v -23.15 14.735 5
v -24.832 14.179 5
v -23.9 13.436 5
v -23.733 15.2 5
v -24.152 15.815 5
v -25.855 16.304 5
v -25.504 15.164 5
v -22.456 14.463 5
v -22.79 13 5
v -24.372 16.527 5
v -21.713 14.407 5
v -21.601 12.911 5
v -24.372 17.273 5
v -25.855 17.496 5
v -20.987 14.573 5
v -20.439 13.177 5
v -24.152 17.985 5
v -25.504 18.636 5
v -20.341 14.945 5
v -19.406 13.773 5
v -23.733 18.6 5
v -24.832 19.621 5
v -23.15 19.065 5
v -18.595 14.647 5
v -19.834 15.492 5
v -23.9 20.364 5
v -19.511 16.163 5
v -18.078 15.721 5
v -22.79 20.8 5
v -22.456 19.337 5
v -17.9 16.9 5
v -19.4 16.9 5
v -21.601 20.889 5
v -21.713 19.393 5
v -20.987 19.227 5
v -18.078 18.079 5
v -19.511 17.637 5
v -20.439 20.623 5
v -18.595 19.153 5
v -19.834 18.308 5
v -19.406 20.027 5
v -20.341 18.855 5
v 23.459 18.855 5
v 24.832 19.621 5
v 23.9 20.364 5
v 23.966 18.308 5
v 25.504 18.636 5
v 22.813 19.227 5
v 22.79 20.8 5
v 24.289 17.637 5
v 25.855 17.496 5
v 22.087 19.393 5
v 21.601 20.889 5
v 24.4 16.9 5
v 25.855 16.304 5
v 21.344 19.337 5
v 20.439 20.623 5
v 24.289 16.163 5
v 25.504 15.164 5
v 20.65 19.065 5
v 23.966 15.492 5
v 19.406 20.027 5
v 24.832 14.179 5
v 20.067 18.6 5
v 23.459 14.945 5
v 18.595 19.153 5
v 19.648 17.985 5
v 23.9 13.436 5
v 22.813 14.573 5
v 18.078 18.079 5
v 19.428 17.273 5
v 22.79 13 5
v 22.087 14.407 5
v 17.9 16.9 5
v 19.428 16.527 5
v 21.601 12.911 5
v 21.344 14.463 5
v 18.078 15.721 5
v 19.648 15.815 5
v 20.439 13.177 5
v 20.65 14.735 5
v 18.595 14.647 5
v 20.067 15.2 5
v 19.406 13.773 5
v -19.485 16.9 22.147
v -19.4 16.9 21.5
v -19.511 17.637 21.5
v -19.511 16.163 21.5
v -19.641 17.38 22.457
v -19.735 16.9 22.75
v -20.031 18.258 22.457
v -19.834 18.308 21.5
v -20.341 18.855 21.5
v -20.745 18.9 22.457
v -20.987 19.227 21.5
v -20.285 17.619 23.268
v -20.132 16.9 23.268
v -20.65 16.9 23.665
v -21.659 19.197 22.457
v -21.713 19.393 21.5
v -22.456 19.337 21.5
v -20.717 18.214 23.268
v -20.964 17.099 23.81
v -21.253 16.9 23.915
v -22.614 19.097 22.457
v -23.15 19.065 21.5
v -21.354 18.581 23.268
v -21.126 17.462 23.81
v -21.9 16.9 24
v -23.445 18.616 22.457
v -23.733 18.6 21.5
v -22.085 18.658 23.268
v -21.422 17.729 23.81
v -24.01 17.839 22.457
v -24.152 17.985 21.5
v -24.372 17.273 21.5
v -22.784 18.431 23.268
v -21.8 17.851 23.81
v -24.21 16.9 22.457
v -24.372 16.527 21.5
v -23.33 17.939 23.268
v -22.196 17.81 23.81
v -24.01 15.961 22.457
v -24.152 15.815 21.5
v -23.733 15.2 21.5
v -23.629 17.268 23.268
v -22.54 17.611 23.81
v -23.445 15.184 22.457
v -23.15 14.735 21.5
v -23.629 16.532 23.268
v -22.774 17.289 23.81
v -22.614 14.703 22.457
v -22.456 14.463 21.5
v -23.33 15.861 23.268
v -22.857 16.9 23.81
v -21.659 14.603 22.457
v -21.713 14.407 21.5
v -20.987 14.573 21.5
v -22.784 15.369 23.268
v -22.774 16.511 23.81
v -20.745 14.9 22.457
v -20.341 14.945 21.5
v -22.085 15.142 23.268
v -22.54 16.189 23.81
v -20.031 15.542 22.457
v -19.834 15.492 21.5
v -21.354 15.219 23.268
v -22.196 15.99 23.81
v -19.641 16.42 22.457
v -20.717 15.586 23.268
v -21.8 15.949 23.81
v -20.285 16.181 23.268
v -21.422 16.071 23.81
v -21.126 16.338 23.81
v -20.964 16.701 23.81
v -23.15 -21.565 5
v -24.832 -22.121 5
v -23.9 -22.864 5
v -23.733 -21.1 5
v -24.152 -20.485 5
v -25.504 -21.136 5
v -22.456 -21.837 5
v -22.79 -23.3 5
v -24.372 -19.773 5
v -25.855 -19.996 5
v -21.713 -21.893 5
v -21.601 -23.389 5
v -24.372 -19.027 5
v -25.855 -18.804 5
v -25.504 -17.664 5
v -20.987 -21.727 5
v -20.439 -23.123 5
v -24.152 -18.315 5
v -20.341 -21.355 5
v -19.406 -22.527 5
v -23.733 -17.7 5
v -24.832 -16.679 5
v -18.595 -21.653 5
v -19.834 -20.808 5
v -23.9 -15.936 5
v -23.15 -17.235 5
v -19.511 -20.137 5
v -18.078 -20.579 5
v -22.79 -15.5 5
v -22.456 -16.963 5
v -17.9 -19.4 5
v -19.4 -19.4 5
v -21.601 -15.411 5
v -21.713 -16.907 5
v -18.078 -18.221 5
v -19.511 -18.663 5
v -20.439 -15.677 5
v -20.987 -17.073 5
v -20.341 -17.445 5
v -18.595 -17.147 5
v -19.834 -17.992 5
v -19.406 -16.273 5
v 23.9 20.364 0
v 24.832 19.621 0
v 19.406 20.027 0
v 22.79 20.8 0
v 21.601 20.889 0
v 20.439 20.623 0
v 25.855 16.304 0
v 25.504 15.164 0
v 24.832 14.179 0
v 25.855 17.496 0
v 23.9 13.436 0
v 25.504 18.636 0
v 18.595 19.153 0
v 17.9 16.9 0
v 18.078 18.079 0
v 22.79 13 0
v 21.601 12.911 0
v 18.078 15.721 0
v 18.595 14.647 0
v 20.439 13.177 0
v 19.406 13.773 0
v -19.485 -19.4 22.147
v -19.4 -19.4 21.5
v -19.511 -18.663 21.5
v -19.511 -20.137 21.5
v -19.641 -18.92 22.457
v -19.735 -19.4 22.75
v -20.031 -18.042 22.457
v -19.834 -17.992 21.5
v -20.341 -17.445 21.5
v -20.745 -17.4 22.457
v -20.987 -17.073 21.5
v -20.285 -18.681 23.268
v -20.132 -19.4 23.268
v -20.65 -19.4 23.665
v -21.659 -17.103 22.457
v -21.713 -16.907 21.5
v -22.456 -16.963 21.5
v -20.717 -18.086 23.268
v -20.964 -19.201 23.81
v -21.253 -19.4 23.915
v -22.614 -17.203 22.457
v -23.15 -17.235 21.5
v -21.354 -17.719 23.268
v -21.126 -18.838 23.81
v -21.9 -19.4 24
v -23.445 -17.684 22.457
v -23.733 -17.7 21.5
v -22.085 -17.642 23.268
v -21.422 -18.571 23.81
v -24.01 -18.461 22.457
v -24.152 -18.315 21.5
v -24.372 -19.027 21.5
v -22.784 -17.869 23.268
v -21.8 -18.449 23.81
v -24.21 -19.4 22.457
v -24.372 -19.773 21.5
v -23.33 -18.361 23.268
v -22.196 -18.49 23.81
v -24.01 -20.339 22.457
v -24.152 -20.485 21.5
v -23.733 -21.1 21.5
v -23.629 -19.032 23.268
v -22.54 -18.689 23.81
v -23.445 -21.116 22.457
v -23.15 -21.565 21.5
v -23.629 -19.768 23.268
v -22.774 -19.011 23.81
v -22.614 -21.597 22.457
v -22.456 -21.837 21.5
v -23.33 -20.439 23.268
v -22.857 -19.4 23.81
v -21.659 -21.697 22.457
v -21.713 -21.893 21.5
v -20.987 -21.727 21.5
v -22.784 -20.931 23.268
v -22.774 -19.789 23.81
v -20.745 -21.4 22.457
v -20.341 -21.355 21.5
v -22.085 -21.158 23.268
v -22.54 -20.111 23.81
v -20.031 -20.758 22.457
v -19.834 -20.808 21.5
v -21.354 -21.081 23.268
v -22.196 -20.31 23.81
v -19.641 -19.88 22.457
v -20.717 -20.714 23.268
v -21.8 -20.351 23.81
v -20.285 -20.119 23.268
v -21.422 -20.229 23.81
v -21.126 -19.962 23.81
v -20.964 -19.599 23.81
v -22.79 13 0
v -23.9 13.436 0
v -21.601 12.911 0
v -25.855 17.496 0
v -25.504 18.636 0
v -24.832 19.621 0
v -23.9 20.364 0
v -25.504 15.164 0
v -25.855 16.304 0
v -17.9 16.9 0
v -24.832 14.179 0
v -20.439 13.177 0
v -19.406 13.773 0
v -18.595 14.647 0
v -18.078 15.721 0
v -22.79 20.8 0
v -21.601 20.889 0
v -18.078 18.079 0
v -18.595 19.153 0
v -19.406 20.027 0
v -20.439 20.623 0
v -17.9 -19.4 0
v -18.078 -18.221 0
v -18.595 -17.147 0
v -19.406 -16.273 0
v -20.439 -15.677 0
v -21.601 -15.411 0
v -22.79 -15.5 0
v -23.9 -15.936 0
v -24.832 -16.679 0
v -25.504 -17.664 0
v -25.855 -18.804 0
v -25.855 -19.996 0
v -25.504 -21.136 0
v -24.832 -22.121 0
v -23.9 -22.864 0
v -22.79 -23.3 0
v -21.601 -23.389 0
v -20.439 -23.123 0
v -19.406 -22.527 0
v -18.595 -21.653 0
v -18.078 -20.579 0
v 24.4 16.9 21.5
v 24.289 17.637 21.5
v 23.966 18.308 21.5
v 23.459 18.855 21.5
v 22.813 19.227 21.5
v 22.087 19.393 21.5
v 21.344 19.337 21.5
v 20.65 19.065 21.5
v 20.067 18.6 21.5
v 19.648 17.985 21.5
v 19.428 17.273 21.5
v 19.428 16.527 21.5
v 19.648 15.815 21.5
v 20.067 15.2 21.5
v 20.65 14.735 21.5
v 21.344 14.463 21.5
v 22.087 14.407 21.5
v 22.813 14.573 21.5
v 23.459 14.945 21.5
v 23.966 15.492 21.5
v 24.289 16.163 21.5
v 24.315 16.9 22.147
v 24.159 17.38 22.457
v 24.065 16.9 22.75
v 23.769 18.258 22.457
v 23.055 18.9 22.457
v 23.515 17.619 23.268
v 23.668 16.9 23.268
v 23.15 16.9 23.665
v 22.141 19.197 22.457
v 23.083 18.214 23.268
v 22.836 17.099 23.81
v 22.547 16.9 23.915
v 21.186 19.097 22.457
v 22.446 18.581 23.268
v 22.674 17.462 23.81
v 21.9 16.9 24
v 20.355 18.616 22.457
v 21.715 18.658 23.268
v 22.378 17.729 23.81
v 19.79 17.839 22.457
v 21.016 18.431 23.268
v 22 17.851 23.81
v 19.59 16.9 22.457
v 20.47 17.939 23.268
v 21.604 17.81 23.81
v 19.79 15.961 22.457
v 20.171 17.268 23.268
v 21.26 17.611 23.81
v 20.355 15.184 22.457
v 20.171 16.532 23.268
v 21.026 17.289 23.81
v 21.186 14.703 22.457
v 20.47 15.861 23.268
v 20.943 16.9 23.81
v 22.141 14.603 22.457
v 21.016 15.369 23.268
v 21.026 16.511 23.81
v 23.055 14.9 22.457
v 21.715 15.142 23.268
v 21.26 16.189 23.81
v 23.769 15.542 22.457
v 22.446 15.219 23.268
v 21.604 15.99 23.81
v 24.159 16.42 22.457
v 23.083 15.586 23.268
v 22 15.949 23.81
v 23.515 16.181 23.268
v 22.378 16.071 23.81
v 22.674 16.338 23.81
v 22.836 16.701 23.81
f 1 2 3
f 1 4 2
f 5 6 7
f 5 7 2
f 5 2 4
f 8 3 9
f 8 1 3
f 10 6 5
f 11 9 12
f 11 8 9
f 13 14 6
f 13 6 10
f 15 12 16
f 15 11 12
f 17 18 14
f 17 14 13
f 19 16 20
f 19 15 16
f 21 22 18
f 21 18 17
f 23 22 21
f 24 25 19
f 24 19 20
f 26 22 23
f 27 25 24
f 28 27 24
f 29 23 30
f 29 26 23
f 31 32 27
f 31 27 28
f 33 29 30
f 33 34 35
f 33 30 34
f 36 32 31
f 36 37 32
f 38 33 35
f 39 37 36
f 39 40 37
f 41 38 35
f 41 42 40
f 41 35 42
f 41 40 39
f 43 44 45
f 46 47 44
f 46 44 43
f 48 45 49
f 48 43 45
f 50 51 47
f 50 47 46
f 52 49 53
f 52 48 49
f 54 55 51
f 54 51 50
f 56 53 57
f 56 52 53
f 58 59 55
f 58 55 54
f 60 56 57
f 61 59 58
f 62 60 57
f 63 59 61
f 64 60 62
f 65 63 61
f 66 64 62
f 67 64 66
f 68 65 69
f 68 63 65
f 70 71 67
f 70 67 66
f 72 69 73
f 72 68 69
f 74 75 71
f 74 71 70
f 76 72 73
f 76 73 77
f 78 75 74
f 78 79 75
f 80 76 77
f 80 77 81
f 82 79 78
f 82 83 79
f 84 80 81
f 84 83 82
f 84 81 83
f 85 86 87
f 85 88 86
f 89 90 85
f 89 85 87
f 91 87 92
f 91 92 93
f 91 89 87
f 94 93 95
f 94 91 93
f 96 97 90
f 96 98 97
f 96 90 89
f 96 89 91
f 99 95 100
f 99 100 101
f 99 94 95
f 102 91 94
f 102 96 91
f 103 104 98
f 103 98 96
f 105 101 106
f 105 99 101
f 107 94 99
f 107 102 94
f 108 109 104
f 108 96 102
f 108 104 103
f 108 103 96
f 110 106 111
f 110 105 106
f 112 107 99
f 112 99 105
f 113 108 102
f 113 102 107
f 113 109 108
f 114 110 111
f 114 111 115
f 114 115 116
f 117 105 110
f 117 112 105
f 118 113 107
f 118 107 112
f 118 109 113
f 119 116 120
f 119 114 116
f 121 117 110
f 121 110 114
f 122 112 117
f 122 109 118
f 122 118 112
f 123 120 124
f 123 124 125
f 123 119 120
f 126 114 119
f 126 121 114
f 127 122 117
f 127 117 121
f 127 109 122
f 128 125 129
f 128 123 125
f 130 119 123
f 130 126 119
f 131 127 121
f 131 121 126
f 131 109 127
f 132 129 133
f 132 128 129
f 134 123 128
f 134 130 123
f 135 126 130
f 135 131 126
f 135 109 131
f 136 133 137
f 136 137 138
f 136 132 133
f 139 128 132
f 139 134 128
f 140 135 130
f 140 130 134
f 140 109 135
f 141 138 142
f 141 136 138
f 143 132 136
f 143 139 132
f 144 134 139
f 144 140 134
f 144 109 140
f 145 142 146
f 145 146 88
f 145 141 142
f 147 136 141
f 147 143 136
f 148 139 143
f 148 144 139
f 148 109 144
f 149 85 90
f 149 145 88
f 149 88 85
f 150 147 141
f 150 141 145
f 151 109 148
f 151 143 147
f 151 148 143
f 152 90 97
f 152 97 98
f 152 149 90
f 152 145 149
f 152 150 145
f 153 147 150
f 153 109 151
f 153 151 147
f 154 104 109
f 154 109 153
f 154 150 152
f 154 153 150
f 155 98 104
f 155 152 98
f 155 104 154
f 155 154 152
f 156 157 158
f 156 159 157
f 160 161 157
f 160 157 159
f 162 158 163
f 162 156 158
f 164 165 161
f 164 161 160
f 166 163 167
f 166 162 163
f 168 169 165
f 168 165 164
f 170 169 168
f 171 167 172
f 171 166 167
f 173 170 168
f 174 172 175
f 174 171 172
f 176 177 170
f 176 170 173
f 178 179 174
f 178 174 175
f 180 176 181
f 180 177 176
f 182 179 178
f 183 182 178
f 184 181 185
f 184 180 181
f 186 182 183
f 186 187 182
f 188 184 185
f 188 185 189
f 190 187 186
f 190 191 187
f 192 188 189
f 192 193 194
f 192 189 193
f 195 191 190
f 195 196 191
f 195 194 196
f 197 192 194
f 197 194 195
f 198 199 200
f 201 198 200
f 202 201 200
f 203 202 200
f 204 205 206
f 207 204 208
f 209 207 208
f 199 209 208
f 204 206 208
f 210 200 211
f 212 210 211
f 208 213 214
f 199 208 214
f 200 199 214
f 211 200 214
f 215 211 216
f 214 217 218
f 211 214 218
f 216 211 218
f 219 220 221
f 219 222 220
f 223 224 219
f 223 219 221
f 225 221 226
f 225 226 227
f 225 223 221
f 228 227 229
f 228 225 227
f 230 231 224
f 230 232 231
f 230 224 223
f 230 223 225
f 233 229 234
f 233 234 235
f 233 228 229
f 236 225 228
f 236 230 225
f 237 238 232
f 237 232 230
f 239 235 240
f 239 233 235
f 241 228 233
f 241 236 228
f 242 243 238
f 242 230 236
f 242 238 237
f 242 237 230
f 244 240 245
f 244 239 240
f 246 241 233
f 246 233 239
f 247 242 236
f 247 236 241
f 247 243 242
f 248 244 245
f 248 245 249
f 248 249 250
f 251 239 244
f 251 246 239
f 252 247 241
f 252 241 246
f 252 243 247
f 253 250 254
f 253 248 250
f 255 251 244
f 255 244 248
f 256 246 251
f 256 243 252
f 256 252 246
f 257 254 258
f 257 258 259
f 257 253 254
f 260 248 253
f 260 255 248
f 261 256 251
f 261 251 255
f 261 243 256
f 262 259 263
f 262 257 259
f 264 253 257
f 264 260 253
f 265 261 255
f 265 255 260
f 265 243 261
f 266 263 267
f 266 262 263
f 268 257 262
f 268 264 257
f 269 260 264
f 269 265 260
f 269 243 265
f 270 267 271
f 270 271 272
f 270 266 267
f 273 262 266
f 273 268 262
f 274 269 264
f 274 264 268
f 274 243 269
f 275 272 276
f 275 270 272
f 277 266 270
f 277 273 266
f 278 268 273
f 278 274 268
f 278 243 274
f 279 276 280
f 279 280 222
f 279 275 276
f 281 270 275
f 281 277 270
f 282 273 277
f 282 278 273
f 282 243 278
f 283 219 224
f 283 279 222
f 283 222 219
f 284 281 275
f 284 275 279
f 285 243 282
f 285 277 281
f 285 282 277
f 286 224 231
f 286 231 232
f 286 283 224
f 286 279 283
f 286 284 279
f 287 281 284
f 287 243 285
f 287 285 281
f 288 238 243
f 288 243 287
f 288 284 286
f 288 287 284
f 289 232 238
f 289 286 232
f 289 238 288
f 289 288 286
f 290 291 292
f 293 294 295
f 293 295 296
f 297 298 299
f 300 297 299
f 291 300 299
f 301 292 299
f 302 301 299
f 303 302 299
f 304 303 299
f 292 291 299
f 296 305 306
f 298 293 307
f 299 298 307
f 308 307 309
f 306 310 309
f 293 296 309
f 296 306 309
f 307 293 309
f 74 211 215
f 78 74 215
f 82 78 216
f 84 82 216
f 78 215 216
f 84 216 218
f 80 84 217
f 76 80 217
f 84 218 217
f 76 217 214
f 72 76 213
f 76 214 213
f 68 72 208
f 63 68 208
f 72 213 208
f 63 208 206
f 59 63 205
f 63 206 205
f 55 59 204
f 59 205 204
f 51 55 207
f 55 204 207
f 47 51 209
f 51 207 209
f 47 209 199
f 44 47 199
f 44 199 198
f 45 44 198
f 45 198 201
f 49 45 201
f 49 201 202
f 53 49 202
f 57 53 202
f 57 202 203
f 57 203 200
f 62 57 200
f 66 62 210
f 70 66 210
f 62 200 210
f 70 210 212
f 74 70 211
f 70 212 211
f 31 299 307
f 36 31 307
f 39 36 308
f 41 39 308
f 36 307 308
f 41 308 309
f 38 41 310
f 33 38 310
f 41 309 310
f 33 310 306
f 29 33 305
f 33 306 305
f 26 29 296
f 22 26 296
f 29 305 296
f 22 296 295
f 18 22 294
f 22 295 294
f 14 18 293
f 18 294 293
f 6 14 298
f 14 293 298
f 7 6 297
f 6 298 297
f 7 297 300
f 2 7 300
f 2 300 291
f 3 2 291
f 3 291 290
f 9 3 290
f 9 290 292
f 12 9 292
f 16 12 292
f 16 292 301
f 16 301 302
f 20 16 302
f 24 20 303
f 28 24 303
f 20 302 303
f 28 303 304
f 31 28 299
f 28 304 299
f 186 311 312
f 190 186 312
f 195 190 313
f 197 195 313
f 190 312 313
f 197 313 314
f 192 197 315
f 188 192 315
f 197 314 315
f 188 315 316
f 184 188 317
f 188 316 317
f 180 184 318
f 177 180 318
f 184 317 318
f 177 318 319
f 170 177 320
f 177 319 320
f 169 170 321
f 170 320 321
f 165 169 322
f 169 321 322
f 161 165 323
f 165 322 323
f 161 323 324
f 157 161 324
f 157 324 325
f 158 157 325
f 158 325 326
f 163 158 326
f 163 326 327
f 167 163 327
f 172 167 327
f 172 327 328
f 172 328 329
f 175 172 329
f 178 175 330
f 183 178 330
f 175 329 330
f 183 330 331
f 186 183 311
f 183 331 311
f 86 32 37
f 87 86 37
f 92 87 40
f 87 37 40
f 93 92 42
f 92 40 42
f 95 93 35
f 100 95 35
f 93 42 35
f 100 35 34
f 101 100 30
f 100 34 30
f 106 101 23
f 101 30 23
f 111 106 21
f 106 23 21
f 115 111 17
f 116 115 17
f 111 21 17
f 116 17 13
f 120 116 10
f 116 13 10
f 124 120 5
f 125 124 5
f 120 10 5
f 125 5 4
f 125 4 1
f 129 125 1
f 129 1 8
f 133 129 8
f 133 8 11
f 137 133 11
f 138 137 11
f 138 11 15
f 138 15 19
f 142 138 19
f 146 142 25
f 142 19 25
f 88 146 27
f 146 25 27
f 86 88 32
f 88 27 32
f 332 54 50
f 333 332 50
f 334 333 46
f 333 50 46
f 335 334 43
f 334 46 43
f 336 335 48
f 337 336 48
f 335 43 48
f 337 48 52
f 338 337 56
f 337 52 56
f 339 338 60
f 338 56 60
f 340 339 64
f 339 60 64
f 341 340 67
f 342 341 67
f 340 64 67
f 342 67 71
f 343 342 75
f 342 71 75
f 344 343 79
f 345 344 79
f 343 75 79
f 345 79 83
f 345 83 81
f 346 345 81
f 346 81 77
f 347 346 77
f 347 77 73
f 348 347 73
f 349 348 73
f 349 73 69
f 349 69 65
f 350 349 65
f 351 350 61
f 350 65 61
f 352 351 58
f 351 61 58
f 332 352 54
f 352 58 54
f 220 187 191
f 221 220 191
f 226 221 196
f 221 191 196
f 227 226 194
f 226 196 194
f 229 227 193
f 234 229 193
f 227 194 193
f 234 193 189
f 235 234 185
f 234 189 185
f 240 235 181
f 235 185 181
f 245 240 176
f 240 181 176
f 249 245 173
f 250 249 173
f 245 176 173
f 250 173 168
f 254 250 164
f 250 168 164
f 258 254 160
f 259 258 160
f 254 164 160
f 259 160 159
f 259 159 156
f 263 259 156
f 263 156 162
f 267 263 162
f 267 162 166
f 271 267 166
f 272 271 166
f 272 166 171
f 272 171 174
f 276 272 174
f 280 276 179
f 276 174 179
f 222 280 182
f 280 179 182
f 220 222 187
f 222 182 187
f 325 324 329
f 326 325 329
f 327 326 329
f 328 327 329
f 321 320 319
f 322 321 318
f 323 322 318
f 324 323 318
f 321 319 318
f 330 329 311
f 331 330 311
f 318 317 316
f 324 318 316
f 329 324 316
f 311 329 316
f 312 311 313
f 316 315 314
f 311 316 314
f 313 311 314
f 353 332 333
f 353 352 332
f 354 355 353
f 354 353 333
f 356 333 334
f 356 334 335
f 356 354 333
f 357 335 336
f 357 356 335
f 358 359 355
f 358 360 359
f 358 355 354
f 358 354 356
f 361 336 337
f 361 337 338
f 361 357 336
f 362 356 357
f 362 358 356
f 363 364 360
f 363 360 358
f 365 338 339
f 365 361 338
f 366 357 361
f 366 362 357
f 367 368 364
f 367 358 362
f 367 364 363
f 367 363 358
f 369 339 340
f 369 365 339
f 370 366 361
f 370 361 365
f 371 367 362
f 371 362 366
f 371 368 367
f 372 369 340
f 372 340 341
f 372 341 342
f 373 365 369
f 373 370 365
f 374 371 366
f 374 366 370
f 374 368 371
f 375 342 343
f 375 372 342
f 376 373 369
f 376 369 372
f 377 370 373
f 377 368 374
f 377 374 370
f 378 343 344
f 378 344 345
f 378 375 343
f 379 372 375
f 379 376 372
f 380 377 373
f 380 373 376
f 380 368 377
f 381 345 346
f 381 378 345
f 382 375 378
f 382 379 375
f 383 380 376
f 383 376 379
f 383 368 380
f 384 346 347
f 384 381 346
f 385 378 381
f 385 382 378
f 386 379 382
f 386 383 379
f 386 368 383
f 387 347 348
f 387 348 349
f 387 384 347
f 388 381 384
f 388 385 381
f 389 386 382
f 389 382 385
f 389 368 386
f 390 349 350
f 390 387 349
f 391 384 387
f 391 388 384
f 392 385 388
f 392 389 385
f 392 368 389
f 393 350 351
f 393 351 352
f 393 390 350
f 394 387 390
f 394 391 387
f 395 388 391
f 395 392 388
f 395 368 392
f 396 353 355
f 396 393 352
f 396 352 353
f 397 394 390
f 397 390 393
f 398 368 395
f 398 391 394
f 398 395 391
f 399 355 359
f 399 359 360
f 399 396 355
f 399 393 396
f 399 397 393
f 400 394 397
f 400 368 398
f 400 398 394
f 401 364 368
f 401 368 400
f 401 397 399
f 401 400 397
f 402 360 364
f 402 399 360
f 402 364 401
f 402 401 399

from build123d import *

# Parameters (mm, degrees)
SKETCH_1_R        = 4
EXTRUDE_1_DEPTH   = 5
EXTRUDE_1_2_DEPTH = 5
EXTRUDE_1_3_DEPTH = 5
SKETCH_2_R        = 2.5
EXTRUDE_2_DEPTH   = 19
FILLET_4_R        = 2.5
FILLET_5_R        = 2.5
FILLET_6_R        = 2.5


with BuildPart() as part:
    # 草圖1 → 填料-伸長1 (new body)
    with BuildSketch(Plane.XY):
        with Locations((-21.9, 16.9)):
            Circle(SKETCH_1_R)
    extrude(amount=EXTRUDE_1_DEPTH)



with BuildPart() as body_2:
    # 草圖1 → Extrude 1 2 (new body)
    with BuildSketch(Plane.XY):
        with Locations((-21.9, -19.4)):
            Circle(SKETCH_1_R)
    extrude(amount=EXTRUDE_1_2_DEPTH)


with BuildPart() as body_3:
    # 草圖1 → Extrude 1 3 (new body)
    with BuildSketch(Plane.XY):
        with Locations(Location((21.9, 16.9, 0), (0, 0, 180))):
            Circle(SKETCH_1_R)
    extrude(amount=EXTRUDE_1_3_DEPTH)


with BuildPart() as part_1:
    add(part.part)

    add(body_2.part)  # 填料-伸長2 merges body 2

    add(body_3.part)  # 填料-伸長2 merges body 3
    # 草圖2 → 填料-伸長2 (add)
    with BuildSketch(Plane.XY.offset(5)):
        with Locations((-21.9, 16.9)):
            Circle(SKETCH_2_R)
        with Locations((21.9, 16.9)):
            Circle(SKETCH_2_R)
        with Locations((-21.9, -19.4)):
            Circle(SKETCH_2_R)
    extrude(amount=EXTRUDE_2_DEPTH)

    # 圓角4
    fillet_4_edges = [part_1.edges().sort_by_distance(p)[0] for p in [
        (-24.4, 16.9, 24),
    ]]
    fillet(fillet_4_edges, radius=FILLET_4_R)

    # 圓角5
    fillet_5_edges = [part_1.edges().sort_by_distance(p)[0] for p in [
        (-24.4, -19.4, 24),
    ]]
    fillet(fillet_5_edges, radius=FILLET_5_R)

    # 圓角6
    fillet_6_edges = [part_1.edges().sort_by_distance(p)[0] for p in [
        (19.4, 16.9, 24),
    ]]
    fillet(fillet_6_edges, radius=FILLET_6_R)


solid = part_1.part
